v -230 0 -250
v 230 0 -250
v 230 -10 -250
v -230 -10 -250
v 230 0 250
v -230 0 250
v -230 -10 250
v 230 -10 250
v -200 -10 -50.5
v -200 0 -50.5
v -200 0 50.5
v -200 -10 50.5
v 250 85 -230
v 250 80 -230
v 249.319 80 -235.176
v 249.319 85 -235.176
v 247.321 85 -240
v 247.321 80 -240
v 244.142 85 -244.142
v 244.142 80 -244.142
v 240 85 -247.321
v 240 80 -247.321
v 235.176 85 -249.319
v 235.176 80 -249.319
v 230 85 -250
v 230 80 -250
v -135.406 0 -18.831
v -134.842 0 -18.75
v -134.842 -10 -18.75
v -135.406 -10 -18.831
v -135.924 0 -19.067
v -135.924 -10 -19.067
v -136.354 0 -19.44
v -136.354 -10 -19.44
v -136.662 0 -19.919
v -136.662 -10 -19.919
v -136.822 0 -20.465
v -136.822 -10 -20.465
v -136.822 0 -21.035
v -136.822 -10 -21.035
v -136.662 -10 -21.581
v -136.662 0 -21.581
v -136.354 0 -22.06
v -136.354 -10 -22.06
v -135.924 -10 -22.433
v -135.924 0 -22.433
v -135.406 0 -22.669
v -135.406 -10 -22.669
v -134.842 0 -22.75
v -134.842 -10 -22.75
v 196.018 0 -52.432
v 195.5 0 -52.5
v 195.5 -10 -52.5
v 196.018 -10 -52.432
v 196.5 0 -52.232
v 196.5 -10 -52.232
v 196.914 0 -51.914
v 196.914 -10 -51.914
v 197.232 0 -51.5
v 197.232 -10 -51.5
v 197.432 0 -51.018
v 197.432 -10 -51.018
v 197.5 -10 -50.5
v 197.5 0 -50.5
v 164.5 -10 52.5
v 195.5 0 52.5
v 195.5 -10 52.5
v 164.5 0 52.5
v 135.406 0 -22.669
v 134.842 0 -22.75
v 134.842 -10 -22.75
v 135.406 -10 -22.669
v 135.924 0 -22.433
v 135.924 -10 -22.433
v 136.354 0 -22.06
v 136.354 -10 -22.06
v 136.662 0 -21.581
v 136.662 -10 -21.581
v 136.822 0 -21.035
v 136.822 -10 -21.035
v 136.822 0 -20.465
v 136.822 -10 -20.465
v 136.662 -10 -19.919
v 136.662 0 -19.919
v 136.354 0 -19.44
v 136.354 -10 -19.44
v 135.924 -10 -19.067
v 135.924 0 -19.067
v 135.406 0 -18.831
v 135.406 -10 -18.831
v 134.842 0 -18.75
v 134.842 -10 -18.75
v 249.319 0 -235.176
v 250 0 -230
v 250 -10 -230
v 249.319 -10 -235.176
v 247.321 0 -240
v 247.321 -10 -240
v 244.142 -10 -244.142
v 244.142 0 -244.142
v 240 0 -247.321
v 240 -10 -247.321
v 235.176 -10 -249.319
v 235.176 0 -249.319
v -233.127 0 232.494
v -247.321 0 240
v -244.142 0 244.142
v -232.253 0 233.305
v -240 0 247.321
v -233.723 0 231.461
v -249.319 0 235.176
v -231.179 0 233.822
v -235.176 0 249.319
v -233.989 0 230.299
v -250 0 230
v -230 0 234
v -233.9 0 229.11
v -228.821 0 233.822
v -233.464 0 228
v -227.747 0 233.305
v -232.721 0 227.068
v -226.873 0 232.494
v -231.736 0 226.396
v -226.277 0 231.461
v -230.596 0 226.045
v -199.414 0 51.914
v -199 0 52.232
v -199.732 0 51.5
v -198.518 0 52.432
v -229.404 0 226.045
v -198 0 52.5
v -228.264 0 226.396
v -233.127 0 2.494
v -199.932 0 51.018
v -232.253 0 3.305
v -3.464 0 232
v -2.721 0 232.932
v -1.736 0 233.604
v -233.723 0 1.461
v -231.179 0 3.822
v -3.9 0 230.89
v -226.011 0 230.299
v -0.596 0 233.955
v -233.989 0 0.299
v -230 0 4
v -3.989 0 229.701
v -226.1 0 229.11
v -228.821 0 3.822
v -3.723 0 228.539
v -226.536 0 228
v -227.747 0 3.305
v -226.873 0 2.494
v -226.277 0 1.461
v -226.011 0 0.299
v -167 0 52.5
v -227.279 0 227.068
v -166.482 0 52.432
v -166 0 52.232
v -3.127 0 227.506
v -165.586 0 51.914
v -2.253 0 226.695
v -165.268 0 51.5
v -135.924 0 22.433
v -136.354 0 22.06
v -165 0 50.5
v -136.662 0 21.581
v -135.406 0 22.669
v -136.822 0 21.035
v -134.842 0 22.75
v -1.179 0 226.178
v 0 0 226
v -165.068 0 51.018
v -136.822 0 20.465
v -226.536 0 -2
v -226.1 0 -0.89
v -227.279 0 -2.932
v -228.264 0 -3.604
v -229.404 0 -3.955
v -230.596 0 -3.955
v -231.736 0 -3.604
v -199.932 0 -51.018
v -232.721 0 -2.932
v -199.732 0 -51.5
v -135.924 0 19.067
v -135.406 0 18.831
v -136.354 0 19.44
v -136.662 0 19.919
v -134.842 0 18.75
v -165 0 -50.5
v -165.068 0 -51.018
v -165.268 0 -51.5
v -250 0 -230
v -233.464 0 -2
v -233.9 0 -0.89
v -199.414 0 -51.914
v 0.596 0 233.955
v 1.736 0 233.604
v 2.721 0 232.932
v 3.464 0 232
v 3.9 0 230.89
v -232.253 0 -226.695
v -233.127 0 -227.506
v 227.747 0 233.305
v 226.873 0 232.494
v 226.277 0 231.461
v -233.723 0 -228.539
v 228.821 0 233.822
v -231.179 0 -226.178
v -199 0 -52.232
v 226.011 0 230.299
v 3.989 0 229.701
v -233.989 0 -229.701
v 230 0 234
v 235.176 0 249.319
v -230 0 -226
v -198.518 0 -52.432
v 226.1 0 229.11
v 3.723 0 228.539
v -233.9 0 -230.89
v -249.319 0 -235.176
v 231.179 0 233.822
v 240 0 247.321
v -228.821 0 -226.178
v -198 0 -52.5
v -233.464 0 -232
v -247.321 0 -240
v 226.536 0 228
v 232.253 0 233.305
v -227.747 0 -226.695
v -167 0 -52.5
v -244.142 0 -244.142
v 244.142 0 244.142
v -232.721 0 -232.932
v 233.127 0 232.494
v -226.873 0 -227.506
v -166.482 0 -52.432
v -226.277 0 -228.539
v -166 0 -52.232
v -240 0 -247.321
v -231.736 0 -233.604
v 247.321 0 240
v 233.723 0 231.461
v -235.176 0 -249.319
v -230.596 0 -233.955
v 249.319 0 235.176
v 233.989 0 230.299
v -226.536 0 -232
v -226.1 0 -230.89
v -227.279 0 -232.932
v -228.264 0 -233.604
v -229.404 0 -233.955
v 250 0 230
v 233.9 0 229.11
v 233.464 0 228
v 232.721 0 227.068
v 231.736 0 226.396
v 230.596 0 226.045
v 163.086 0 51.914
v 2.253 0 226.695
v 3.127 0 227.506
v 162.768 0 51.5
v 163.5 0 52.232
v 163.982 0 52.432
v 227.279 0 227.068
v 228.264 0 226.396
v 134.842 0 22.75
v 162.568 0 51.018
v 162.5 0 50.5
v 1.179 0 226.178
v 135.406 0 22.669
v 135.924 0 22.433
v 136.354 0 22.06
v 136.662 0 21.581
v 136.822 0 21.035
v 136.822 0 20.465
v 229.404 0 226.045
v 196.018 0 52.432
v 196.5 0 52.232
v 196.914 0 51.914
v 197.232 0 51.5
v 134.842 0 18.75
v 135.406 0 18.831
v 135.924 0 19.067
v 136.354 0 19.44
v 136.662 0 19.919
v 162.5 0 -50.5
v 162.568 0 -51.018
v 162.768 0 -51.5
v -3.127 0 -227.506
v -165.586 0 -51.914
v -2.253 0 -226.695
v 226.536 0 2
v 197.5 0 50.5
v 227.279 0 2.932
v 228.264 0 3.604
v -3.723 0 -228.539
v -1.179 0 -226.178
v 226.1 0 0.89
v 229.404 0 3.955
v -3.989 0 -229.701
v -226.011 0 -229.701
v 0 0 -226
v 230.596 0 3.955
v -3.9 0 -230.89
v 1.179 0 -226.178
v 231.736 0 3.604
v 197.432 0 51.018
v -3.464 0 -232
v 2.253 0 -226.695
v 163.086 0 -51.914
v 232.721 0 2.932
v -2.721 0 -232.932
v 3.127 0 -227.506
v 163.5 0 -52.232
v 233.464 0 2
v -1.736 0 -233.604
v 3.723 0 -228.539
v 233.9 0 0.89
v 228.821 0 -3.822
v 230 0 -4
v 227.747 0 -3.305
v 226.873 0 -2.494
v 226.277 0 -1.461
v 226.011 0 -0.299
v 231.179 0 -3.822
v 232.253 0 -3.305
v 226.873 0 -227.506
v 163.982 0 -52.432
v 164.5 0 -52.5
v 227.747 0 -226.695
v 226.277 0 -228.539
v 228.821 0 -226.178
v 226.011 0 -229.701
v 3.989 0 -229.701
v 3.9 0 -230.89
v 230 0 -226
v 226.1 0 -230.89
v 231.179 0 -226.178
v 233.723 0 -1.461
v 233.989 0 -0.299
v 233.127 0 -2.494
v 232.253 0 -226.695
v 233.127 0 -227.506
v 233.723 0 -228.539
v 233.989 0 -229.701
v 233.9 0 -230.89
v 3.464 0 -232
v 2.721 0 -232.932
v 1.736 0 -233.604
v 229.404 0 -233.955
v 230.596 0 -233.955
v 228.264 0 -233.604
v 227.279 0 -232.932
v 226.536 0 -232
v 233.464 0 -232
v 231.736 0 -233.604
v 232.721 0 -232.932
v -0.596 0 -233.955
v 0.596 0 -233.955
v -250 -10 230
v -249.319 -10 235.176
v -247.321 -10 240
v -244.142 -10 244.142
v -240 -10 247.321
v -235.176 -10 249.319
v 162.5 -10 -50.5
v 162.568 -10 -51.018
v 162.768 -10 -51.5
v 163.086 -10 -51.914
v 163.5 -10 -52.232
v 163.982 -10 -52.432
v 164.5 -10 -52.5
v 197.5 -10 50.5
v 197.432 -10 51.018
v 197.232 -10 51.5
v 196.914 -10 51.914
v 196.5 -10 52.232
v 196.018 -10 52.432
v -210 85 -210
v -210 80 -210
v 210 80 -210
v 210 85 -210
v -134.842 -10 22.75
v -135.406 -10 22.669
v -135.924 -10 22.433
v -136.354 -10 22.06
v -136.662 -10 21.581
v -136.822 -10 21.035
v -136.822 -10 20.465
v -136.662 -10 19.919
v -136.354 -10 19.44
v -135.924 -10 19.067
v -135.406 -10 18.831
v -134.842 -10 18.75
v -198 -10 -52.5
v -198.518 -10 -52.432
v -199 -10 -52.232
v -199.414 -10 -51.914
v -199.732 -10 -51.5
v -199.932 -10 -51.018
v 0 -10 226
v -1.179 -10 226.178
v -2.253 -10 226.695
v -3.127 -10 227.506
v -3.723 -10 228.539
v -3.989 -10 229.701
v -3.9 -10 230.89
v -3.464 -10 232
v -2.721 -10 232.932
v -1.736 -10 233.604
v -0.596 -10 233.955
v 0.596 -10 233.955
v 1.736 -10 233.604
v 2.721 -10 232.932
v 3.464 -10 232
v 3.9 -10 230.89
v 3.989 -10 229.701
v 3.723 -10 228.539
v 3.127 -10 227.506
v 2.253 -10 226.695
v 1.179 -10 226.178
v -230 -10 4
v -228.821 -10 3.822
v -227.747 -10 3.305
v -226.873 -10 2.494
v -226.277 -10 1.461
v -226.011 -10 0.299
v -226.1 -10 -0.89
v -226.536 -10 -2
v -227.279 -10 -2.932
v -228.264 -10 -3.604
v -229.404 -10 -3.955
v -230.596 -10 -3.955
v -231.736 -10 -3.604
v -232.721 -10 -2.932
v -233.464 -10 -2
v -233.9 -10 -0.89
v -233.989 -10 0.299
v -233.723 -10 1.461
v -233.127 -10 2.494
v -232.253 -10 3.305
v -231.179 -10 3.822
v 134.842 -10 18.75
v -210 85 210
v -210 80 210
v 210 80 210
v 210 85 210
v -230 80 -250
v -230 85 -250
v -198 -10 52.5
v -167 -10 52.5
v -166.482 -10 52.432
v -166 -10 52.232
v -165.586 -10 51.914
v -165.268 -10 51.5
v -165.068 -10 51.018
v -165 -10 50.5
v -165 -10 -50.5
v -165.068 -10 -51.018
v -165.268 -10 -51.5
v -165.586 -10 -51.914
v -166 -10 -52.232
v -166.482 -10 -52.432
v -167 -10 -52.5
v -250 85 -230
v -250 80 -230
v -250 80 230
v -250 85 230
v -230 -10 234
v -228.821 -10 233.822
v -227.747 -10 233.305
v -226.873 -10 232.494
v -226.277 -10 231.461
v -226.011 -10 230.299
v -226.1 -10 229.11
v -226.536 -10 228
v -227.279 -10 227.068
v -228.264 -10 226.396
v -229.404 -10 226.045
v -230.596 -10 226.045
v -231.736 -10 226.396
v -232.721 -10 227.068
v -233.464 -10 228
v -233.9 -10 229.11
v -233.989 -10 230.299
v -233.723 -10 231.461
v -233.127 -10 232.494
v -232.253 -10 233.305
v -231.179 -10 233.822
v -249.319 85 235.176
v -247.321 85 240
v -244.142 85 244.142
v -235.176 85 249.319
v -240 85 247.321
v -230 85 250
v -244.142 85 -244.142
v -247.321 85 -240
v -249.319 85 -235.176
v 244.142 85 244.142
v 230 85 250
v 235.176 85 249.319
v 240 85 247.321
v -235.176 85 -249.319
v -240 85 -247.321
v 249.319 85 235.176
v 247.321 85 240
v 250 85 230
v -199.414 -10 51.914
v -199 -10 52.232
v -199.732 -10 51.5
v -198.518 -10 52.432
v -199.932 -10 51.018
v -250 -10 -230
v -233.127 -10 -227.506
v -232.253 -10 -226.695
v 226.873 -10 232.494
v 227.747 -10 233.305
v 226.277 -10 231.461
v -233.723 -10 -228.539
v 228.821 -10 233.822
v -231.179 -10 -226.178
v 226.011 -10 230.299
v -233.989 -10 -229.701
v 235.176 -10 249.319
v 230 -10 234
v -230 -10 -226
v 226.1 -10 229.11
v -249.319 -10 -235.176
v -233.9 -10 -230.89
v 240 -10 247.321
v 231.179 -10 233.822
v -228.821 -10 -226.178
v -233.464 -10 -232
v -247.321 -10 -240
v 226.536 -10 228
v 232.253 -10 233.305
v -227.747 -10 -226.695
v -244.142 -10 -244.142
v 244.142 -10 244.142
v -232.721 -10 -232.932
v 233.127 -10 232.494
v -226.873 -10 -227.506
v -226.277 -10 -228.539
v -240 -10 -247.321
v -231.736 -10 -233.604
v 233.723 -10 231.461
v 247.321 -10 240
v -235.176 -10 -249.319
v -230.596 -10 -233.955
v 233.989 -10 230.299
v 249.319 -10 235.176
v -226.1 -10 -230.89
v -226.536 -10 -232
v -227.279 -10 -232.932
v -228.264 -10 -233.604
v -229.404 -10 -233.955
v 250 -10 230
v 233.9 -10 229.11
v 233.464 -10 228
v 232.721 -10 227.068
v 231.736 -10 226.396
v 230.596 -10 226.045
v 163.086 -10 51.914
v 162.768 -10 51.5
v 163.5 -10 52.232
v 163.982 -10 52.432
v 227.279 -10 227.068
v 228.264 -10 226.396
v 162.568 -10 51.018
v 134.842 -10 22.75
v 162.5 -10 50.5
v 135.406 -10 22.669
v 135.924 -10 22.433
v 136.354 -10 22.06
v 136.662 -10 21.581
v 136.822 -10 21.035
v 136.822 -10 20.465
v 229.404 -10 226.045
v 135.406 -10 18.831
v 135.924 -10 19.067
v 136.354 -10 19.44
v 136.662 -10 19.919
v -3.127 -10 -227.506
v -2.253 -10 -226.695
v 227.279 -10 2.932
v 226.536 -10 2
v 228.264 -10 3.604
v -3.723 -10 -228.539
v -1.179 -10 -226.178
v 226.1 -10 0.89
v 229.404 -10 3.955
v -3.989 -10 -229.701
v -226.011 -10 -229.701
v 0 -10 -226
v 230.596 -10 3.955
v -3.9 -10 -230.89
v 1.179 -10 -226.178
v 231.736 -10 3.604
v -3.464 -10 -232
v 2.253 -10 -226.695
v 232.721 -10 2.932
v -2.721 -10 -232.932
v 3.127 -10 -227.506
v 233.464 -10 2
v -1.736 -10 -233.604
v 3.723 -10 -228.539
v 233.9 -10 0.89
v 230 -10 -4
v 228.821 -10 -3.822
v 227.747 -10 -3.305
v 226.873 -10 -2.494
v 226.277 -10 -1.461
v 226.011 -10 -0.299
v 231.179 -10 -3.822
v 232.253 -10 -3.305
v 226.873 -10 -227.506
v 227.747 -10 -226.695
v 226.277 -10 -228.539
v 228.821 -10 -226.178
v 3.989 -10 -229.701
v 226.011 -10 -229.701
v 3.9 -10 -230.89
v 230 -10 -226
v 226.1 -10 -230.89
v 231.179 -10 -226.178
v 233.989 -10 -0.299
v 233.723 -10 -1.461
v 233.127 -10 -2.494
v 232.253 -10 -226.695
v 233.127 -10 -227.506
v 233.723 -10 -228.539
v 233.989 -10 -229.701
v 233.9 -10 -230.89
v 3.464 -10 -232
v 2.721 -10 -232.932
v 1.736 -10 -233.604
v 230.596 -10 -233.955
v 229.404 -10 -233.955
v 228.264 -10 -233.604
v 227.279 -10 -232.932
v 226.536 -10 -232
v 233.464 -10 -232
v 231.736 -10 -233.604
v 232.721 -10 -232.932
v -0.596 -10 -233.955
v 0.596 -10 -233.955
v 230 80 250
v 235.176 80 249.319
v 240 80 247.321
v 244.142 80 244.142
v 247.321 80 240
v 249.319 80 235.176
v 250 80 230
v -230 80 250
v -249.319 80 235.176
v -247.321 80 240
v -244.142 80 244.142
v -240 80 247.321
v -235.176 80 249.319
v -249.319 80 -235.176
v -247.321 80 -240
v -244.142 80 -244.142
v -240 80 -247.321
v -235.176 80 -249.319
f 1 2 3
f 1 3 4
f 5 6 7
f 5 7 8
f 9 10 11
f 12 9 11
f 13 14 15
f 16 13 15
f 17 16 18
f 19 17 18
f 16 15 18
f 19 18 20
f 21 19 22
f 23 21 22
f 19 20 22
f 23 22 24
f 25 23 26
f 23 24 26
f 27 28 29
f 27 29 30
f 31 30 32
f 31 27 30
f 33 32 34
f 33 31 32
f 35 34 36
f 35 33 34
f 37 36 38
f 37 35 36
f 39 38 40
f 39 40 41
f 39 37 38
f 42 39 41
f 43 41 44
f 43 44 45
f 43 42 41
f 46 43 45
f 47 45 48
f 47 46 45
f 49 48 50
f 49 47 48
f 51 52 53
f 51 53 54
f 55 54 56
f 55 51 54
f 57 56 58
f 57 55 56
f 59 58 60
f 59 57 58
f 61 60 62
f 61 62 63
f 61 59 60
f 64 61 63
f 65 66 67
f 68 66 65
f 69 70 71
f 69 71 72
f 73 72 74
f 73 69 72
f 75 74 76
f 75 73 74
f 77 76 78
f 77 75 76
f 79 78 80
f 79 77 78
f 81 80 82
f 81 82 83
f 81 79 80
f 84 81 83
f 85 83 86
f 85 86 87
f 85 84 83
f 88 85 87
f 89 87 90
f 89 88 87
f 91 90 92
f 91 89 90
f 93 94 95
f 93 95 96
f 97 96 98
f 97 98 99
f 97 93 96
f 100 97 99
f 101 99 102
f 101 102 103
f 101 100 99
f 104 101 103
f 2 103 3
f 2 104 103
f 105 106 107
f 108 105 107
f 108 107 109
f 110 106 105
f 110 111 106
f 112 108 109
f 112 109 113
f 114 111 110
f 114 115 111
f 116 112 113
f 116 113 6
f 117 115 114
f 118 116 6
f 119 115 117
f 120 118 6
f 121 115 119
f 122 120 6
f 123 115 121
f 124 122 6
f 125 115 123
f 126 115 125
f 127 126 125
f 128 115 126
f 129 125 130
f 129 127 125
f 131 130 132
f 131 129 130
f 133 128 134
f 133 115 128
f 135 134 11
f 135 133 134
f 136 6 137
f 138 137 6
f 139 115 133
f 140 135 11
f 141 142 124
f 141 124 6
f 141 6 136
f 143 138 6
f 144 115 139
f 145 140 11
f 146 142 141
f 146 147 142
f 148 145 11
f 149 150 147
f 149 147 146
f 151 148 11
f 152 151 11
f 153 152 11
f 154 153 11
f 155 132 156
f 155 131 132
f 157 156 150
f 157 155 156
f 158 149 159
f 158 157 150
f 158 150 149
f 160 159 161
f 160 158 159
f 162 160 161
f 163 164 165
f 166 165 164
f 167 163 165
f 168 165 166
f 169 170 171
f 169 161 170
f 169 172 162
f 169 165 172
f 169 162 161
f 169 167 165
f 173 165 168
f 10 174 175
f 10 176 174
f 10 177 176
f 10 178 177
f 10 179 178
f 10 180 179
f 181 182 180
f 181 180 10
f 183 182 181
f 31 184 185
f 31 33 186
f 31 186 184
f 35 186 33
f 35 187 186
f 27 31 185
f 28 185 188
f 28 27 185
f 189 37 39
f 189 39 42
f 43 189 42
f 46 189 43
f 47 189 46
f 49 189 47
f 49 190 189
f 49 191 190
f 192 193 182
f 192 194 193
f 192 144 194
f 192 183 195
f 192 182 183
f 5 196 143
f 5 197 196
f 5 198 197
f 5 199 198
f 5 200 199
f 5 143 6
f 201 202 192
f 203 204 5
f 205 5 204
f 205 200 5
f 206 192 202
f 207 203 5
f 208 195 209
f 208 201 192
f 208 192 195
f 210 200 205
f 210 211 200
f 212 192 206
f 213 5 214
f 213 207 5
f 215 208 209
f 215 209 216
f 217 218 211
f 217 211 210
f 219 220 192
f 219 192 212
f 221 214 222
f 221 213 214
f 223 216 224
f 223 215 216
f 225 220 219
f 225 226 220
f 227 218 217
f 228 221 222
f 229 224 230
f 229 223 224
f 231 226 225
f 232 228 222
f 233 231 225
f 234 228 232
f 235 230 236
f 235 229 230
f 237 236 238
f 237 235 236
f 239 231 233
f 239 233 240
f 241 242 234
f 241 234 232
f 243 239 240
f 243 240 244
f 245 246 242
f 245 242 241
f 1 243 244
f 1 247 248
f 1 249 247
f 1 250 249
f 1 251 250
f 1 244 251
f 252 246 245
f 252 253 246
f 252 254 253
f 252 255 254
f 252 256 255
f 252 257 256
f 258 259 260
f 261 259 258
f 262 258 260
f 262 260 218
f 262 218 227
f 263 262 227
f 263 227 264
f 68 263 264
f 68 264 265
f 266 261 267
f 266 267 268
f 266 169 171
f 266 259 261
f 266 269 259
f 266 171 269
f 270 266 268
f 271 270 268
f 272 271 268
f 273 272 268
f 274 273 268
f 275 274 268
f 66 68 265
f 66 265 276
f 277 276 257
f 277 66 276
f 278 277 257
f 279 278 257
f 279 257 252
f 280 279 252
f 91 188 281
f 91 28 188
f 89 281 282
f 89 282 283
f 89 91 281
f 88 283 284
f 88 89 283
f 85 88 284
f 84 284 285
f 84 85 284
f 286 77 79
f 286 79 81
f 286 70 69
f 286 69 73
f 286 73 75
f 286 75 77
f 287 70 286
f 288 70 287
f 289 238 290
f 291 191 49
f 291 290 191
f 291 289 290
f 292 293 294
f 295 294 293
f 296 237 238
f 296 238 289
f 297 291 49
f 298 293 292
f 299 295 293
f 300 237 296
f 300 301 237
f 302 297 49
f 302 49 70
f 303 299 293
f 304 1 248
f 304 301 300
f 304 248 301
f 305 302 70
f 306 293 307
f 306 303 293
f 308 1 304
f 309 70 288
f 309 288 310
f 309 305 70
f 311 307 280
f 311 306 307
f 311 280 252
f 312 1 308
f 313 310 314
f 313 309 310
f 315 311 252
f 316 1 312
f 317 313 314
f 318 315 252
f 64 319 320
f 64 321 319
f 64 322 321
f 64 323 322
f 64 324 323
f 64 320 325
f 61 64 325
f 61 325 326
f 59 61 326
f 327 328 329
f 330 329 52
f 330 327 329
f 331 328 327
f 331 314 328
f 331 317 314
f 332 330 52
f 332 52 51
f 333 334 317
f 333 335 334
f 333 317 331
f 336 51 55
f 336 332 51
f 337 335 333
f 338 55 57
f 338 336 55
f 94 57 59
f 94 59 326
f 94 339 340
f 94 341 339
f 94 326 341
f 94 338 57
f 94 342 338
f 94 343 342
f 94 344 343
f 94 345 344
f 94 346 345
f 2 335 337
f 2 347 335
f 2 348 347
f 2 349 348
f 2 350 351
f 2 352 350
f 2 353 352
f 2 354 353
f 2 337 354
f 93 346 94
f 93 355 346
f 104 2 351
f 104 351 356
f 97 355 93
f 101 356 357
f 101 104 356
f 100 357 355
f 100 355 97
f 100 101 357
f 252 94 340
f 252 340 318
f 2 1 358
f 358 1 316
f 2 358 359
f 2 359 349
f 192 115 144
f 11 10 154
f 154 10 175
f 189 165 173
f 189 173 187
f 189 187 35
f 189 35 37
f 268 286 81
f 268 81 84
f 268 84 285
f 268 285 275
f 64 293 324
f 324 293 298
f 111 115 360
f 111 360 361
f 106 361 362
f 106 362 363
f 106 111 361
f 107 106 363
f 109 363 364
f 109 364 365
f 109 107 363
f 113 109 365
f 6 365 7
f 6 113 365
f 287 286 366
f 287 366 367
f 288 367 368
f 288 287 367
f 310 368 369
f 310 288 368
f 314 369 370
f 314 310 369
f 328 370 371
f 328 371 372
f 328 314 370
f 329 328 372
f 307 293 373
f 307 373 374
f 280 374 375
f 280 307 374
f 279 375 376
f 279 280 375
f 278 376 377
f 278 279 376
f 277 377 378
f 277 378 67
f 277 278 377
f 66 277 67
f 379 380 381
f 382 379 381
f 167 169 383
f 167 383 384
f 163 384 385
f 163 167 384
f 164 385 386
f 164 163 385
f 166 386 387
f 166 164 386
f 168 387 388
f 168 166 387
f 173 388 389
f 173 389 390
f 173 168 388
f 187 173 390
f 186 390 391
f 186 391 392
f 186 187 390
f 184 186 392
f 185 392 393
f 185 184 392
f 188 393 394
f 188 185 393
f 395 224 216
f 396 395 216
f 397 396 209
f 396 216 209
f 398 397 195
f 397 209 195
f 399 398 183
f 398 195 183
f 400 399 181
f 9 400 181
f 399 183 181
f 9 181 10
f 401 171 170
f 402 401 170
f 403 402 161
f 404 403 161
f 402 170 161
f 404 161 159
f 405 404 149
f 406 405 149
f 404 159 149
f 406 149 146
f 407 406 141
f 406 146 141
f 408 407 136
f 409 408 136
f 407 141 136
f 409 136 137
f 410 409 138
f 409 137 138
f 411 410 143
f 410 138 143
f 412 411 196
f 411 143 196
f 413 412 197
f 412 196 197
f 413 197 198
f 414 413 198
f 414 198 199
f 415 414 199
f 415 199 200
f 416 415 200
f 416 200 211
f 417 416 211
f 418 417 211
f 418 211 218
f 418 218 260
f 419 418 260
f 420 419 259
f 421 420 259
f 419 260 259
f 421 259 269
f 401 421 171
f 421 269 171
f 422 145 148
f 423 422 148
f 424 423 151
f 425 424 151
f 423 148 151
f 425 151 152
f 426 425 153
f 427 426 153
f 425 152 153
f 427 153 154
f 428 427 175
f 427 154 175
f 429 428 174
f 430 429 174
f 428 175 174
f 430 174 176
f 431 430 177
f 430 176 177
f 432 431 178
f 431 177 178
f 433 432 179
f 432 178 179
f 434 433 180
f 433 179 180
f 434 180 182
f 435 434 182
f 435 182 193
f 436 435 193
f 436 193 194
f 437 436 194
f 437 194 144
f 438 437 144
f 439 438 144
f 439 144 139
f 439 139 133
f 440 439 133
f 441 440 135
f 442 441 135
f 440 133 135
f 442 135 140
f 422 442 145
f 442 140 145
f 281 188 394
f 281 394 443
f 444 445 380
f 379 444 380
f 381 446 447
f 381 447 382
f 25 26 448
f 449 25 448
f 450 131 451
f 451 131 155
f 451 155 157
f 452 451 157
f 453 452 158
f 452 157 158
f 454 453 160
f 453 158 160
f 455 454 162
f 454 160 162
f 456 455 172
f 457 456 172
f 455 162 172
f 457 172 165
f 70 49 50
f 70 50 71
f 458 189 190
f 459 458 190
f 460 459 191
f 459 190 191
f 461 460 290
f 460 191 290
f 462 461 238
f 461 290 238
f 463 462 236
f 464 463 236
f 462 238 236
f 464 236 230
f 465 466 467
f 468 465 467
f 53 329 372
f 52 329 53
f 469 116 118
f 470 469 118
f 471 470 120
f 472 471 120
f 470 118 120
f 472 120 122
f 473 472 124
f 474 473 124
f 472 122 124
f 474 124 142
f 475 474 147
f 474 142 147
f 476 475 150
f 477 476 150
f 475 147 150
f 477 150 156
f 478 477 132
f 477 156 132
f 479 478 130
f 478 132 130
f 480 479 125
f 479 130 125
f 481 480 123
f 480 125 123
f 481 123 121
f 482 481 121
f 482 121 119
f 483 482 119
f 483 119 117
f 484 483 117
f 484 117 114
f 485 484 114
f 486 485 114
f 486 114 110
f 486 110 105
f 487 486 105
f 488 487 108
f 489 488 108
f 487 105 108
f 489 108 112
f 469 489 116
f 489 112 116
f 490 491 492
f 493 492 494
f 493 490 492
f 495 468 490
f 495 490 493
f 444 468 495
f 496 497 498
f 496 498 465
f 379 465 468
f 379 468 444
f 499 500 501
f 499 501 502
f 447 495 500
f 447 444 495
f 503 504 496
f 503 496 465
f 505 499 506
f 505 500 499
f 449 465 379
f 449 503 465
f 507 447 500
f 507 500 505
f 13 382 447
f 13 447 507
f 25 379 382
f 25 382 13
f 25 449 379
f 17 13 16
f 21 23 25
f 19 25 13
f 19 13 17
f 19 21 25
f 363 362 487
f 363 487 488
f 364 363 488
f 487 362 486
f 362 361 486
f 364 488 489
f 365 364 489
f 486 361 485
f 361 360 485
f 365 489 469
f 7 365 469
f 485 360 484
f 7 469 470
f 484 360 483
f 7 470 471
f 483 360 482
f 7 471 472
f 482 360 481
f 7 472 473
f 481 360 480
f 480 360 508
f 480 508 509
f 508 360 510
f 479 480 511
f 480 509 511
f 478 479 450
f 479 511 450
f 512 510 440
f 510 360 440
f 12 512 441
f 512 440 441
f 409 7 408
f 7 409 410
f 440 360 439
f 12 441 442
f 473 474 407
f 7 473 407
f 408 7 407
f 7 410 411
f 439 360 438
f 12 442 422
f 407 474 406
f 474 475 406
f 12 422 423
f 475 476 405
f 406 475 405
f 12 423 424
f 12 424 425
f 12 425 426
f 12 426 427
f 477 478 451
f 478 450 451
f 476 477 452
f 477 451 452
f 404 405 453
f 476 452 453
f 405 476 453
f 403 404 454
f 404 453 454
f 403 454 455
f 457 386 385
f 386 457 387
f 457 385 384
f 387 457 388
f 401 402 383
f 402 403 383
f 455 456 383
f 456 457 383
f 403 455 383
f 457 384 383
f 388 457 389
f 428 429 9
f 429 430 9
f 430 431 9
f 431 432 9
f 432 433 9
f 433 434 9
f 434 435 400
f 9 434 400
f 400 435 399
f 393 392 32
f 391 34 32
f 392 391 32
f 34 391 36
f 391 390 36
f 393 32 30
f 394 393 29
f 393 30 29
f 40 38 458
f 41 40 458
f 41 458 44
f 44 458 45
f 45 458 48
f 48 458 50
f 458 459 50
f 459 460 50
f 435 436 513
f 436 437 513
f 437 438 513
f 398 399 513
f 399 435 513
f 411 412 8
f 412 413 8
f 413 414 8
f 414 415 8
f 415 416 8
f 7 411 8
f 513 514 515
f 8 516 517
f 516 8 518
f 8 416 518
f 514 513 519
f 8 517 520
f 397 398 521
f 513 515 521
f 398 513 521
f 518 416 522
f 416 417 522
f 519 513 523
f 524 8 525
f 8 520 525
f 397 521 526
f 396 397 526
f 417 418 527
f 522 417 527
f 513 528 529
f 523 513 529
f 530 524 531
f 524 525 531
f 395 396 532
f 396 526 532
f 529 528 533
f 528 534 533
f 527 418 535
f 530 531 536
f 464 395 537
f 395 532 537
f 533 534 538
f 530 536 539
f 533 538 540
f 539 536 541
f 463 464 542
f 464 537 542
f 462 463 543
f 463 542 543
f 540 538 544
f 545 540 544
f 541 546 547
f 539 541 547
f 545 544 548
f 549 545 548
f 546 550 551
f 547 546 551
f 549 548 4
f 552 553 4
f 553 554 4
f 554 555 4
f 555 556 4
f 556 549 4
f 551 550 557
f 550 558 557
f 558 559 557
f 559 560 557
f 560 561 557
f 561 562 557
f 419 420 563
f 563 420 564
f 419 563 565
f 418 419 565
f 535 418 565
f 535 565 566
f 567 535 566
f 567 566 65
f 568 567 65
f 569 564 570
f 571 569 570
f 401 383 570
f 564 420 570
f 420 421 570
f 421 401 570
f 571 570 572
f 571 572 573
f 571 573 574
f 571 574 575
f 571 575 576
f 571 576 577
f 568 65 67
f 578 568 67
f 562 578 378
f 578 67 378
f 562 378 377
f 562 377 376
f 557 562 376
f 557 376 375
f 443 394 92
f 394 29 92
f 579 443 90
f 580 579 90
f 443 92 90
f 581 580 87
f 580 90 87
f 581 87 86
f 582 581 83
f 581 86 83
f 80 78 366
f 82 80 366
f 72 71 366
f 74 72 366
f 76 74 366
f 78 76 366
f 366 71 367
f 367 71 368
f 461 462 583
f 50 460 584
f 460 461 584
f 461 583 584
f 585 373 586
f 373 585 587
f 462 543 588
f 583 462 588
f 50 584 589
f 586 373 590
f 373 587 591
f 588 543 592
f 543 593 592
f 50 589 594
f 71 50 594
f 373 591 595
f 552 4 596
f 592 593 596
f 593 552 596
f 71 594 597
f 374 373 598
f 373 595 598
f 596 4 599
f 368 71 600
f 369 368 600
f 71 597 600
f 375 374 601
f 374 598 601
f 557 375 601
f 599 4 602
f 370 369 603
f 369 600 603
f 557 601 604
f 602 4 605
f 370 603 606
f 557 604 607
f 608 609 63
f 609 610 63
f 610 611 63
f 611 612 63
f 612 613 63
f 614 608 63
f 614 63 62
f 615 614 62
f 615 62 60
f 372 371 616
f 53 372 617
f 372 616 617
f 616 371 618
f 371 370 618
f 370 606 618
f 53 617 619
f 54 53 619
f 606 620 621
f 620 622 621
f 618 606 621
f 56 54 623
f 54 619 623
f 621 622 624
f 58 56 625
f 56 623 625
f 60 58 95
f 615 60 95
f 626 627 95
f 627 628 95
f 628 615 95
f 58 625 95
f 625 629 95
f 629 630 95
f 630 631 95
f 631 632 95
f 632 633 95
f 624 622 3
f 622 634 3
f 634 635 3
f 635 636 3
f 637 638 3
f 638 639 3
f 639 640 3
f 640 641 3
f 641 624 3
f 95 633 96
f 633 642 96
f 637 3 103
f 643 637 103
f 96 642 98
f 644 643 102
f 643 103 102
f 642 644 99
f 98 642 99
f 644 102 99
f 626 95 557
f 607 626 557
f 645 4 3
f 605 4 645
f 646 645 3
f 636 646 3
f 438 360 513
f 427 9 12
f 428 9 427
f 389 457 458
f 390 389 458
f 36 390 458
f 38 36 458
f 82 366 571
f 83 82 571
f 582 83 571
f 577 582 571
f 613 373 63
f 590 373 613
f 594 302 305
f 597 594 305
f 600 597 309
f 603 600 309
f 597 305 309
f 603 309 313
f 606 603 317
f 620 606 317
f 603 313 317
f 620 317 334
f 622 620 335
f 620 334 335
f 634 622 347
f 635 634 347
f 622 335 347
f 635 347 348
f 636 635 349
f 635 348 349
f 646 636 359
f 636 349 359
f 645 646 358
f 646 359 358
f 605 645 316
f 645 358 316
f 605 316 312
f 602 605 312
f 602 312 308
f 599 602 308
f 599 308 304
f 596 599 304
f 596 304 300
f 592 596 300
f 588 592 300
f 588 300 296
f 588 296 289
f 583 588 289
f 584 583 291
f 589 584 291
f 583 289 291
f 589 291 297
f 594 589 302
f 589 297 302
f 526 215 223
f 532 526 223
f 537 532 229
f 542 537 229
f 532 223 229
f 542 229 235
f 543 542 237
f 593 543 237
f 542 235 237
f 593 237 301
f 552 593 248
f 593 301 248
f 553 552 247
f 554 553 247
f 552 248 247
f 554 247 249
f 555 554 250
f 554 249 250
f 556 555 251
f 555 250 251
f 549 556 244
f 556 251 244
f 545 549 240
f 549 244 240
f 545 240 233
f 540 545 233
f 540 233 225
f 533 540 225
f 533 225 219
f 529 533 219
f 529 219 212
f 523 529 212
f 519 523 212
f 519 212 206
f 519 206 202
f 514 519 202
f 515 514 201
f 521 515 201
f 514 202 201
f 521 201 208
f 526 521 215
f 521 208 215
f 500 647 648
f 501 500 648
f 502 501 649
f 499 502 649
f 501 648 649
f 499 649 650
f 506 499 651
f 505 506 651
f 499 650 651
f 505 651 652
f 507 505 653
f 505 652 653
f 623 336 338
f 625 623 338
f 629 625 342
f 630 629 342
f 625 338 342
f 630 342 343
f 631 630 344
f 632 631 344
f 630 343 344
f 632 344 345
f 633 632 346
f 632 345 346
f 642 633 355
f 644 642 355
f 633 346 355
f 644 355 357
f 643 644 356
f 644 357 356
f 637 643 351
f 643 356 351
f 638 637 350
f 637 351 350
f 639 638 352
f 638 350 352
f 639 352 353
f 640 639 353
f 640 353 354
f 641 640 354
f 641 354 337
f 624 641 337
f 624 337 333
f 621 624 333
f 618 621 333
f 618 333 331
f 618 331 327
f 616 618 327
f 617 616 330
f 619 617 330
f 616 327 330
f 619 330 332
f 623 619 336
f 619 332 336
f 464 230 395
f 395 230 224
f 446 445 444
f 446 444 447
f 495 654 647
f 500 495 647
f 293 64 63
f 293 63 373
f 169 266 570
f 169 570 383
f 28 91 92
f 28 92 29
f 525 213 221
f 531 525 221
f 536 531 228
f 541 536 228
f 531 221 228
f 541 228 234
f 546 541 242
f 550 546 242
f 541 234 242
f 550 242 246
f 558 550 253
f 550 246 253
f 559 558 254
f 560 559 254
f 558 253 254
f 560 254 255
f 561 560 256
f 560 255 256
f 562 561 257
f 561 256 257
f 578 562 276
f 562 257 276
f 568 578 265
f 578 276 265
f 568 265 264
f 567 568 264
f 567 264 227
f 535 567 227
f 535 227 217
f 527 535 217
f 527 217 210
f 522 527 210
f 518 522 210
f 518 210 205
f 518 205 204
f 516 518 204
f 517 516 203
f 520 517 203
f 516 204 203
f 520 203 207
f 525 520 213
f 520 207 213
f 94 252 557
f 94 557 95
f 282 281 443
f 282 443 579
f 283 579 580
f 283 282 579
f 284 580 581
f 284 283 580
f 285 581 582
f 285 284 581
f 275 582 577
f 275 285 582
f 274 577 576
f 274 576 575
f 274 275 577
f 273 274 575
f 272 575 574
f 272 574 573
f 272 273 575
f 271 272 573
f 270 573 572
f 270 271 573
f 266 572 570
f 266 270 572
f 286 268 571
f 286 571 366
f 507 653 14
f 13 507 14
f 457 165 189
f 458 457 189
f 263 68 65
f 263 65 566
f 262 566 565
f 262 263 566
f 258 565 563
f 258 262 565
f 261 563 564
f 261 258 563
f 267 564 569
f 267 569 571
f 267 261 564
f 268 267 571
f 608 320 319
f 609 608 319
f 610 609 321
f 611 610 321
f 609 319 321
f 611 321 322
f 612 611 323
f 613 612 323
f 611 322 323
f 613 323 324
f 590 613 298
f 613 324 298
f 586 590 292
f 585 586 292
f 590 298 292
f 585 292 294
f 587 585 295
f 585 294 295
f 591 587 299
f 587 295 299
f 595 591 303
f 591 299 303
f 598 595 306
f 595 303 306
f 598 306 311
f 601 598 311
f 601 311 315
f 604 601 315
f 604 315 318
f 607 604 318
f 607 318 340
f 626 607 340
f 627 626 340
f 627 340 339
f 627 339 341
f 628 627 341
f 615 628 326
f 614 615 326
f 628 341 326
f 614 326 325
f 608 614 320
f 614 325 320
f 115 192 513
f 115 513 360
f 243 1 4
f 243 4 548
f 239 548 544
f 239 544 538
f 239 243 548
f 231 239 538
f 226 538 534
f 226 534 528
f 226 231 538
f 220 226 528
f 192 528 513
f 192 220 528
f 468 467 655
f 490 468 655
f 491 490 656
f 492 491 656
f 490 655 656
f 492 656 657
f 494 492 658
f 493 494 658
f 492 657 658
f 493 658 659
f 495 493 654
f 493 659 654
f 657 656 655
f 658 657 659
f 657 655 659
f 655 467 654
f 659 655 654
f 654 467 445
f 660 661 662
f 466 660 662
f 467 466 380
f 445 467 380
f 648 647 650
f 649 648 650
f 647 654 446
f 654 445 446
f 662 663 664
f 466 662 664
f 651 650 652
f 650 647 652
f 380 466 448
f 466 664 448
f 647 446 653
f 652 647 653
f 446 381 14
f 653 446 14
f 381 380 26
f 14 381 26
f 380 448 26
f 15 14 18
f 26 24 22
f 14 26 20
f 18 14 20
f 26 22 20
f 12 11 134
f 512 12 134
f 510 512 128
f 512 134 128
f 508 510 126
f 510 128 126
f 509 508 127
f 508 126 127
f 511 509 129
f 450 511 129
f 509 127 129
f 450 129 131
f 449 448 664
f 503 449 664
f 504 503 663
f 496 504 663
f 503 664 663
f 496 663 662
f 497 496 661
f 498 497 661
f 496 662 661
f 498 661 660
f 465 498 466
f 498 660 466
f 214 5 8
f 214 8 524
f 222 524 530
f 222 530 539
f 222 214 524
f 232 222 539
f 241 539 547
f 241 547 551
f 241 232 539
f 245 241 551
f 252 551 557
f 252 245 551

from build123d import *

# Parameters (mm, degrees)
SKETCH1_R           = 4
BOSS_EXTRUDE1_DEPTH = 10
SKETCH3_W           = 420
SKETCH3_H           = 420
BOSS_EXTRUDE2_DEPTH = 5
CUT_EXTRUDE1_DEPTH  = 10


with BuildPart() as part:
    # Sketch1 → Boss-Extrude1 (new body)
    with BuildSketch(Plane(origin=(0, 0, 0), x_dir=(1, 0, 0), z_dir=(0, 1, 0))):
        with BuildLine():
            Line((-230, -250), (230, -250))
            ThreePointArc((230, -250), (244.142135624, -244.142135624), (250, -230))
            Line((250, -230), (250, 230))
            ThreePointArc((250, 230), (244.142135624, 244.142135624), (230, 250))
            Line((230, 250), (-230, 250))
            ThreePointArc((-230, 250), (-244.142135624, 244.142135624), (-250, 230))
            Line((-250, 230), (-250, -230))
            ThreePointArc((-250, -230), (-244.142135624, -244.142135624), (-230, -250))
        make_face()
        with Locations(Location((-230, 230, 0), (0, 0, 270))):
            Circle(SKETCH1_R, mode=Mode.SUBTRACT)
        with Locations(Location((230, 230, 0), (0, 0, 270))):
            Circle(SKETCH1_R, mode=Mode.SUBTRACT)
        with Locations(Location((230, -230, 0), (0, 0, 270))):
            Circle(SKETCH1_R, mode=Mode.SUBTRACT)
        with Locations(Location((-230, -230, 0), (0, 0, 270))):
            Circle(SKETCH1_R, mode=Mode.SUBTRACT)
        with Locations(Location((0, 230, 0), (0, 0, 270))):
            Circle(SKETCH1_R, mode=Mode.SUBTRACT)
        with Locations(Location((-230, 0, 0), (0, 0, 270))):
            Circle(SKETCH1_R, mode=Mode.SUBTRACT)
        with Locations(Location((230, 0, 0), (0, 0, 90))):
            Circle(SKETCH1_R, mode=Mode.SUBTRACT)
        with Locations(Location((0, -230, 0), (0, 0, 90))):
            Circle(SKETCH1_R, mode=Mode.SUBTRACT)
        with BuildLine():
            Line((-198, -52.5), (-167, -52.5))
            ThreePointArc((-167, -52.5), (-165.585786438, -51.914213562), (-165, -50.5))
            Line((-165, -50.5), (-165, 50.5))
            ThreePointArc((-165, 50.5), (-165.585786438, 51.914213562), (-167, 52.5))
            Line((-167, 52.5), (-198, 52.5))
            ThreePointArc((-198, 52.5), (-199.414213562, 51.914213562), (-200, 50.5))
            Line((-200, 50.5), (-200, -50.5))
            ThreePointArc((-200, -50.5), (-199.414213562, -51.914213562), (-198, -52.5))
        make_face(mode=Mode.SUBTRACT)
        with BuildLine():
            Line((195.5, -52.5), (164.5, -52.5))
            ThreePointArc((164.5, -52.5), (163.085786438, -51.914213562), (162.5, -50.5))
            Line((162.5, -50.5), (162.5, 50.5))
            ThreePointArc((162.5, 50.5), (163.085786438, 51.914213562), (164.5, 52.5))
            Line((164.5, 52.5), (195.5, 52.5))
            ThreePointArc((195.5, 52.5), (196.914213562, 51.914213562), (197.5, 50.5))
            Line((197.5, 50.5), (197.5, -50.5))
            ThreePointArc((197.5, -50.5), (196.914213562, -51.914213562), (195.5, -52.5))
        make_face(mode=Mode.SUBTRACT)
    extrude(amount=-BOSS_EXTRUDE1_DEPTH)

    # Sketch10 → Cut-Extrude1 (cut)
    with BuildSketch(Plane(origin=(0, 0, 0), x_dir=(1, 0, 0), z_dir=(0, 1, 0))):
        with BuildLine():
            Line((-134.842461188, 22.75), (134.842461188, 22.75))
            ThreePointArc((134.842461188, 22.75), (136.842461188, 20.75), (134.842461188, 18.75))
            Line((134.842461188, 18.75), (-134.842461188, 18.75))
            ThreePointArc((-134.842461188, 18.75), (-136.842461188, 20.75), (-134.842461188, 22.75))
        make_face()
        with BuildLine():
            Line((-134.842461188, -18.75), (134.842461188, -18.75))
            ThreePointArc((134.842461188, -18.75), (136.842461188, -20.75), (134.842461188, -22.75))
            Line((134.842461188, -22.75), (-134.842461188, -22.75))
            ThreePointArc((-134.842461188, -22.75), (-136.842461188, -20.75), (-134.842461188, -18.75))
        make_face()
    extrude(amount=-CUT_EXTRUDE1_DEPTH, mode=Mode.SUBTRACT)


with BuildPart() as body_2:
    # Sketch3 → Boss-Extrude2 (new body)
    with BuildSketch(Plane(origin=(0, 80, 0), x_dir=(1, 0, 0), z_dir=(0, 1, 0))):
        with BuildLine():
            Line((-230, -250), (230, -250))
            ThreePointArc((230, -250), (244.142135624, -244.142135624), (250, -230))
            Line((250, -230), (250, 230))
            ThreePointArc((250, 230), (244.142135624, 244.142135624), (230, 250))
            Line((230, 250), (-230, 250))
            ThreePointArc((-230, 250), (-244.142135624, 244.142135624), (-250, 230))
            Line((-250, 230), (-250, -230))
            ThreePointArc((-250, -230), (-244.142135624, -244.142135624), (-230, -250))
        make_face()
        Rectangle(SKETCH3_W, SKETCH3_H, mode=Mode.SUBTRACT)
    extrude(amount=BOSS_EXTRUDE2_DEPTH)


solid = Compound([part.part, body_2.part])
